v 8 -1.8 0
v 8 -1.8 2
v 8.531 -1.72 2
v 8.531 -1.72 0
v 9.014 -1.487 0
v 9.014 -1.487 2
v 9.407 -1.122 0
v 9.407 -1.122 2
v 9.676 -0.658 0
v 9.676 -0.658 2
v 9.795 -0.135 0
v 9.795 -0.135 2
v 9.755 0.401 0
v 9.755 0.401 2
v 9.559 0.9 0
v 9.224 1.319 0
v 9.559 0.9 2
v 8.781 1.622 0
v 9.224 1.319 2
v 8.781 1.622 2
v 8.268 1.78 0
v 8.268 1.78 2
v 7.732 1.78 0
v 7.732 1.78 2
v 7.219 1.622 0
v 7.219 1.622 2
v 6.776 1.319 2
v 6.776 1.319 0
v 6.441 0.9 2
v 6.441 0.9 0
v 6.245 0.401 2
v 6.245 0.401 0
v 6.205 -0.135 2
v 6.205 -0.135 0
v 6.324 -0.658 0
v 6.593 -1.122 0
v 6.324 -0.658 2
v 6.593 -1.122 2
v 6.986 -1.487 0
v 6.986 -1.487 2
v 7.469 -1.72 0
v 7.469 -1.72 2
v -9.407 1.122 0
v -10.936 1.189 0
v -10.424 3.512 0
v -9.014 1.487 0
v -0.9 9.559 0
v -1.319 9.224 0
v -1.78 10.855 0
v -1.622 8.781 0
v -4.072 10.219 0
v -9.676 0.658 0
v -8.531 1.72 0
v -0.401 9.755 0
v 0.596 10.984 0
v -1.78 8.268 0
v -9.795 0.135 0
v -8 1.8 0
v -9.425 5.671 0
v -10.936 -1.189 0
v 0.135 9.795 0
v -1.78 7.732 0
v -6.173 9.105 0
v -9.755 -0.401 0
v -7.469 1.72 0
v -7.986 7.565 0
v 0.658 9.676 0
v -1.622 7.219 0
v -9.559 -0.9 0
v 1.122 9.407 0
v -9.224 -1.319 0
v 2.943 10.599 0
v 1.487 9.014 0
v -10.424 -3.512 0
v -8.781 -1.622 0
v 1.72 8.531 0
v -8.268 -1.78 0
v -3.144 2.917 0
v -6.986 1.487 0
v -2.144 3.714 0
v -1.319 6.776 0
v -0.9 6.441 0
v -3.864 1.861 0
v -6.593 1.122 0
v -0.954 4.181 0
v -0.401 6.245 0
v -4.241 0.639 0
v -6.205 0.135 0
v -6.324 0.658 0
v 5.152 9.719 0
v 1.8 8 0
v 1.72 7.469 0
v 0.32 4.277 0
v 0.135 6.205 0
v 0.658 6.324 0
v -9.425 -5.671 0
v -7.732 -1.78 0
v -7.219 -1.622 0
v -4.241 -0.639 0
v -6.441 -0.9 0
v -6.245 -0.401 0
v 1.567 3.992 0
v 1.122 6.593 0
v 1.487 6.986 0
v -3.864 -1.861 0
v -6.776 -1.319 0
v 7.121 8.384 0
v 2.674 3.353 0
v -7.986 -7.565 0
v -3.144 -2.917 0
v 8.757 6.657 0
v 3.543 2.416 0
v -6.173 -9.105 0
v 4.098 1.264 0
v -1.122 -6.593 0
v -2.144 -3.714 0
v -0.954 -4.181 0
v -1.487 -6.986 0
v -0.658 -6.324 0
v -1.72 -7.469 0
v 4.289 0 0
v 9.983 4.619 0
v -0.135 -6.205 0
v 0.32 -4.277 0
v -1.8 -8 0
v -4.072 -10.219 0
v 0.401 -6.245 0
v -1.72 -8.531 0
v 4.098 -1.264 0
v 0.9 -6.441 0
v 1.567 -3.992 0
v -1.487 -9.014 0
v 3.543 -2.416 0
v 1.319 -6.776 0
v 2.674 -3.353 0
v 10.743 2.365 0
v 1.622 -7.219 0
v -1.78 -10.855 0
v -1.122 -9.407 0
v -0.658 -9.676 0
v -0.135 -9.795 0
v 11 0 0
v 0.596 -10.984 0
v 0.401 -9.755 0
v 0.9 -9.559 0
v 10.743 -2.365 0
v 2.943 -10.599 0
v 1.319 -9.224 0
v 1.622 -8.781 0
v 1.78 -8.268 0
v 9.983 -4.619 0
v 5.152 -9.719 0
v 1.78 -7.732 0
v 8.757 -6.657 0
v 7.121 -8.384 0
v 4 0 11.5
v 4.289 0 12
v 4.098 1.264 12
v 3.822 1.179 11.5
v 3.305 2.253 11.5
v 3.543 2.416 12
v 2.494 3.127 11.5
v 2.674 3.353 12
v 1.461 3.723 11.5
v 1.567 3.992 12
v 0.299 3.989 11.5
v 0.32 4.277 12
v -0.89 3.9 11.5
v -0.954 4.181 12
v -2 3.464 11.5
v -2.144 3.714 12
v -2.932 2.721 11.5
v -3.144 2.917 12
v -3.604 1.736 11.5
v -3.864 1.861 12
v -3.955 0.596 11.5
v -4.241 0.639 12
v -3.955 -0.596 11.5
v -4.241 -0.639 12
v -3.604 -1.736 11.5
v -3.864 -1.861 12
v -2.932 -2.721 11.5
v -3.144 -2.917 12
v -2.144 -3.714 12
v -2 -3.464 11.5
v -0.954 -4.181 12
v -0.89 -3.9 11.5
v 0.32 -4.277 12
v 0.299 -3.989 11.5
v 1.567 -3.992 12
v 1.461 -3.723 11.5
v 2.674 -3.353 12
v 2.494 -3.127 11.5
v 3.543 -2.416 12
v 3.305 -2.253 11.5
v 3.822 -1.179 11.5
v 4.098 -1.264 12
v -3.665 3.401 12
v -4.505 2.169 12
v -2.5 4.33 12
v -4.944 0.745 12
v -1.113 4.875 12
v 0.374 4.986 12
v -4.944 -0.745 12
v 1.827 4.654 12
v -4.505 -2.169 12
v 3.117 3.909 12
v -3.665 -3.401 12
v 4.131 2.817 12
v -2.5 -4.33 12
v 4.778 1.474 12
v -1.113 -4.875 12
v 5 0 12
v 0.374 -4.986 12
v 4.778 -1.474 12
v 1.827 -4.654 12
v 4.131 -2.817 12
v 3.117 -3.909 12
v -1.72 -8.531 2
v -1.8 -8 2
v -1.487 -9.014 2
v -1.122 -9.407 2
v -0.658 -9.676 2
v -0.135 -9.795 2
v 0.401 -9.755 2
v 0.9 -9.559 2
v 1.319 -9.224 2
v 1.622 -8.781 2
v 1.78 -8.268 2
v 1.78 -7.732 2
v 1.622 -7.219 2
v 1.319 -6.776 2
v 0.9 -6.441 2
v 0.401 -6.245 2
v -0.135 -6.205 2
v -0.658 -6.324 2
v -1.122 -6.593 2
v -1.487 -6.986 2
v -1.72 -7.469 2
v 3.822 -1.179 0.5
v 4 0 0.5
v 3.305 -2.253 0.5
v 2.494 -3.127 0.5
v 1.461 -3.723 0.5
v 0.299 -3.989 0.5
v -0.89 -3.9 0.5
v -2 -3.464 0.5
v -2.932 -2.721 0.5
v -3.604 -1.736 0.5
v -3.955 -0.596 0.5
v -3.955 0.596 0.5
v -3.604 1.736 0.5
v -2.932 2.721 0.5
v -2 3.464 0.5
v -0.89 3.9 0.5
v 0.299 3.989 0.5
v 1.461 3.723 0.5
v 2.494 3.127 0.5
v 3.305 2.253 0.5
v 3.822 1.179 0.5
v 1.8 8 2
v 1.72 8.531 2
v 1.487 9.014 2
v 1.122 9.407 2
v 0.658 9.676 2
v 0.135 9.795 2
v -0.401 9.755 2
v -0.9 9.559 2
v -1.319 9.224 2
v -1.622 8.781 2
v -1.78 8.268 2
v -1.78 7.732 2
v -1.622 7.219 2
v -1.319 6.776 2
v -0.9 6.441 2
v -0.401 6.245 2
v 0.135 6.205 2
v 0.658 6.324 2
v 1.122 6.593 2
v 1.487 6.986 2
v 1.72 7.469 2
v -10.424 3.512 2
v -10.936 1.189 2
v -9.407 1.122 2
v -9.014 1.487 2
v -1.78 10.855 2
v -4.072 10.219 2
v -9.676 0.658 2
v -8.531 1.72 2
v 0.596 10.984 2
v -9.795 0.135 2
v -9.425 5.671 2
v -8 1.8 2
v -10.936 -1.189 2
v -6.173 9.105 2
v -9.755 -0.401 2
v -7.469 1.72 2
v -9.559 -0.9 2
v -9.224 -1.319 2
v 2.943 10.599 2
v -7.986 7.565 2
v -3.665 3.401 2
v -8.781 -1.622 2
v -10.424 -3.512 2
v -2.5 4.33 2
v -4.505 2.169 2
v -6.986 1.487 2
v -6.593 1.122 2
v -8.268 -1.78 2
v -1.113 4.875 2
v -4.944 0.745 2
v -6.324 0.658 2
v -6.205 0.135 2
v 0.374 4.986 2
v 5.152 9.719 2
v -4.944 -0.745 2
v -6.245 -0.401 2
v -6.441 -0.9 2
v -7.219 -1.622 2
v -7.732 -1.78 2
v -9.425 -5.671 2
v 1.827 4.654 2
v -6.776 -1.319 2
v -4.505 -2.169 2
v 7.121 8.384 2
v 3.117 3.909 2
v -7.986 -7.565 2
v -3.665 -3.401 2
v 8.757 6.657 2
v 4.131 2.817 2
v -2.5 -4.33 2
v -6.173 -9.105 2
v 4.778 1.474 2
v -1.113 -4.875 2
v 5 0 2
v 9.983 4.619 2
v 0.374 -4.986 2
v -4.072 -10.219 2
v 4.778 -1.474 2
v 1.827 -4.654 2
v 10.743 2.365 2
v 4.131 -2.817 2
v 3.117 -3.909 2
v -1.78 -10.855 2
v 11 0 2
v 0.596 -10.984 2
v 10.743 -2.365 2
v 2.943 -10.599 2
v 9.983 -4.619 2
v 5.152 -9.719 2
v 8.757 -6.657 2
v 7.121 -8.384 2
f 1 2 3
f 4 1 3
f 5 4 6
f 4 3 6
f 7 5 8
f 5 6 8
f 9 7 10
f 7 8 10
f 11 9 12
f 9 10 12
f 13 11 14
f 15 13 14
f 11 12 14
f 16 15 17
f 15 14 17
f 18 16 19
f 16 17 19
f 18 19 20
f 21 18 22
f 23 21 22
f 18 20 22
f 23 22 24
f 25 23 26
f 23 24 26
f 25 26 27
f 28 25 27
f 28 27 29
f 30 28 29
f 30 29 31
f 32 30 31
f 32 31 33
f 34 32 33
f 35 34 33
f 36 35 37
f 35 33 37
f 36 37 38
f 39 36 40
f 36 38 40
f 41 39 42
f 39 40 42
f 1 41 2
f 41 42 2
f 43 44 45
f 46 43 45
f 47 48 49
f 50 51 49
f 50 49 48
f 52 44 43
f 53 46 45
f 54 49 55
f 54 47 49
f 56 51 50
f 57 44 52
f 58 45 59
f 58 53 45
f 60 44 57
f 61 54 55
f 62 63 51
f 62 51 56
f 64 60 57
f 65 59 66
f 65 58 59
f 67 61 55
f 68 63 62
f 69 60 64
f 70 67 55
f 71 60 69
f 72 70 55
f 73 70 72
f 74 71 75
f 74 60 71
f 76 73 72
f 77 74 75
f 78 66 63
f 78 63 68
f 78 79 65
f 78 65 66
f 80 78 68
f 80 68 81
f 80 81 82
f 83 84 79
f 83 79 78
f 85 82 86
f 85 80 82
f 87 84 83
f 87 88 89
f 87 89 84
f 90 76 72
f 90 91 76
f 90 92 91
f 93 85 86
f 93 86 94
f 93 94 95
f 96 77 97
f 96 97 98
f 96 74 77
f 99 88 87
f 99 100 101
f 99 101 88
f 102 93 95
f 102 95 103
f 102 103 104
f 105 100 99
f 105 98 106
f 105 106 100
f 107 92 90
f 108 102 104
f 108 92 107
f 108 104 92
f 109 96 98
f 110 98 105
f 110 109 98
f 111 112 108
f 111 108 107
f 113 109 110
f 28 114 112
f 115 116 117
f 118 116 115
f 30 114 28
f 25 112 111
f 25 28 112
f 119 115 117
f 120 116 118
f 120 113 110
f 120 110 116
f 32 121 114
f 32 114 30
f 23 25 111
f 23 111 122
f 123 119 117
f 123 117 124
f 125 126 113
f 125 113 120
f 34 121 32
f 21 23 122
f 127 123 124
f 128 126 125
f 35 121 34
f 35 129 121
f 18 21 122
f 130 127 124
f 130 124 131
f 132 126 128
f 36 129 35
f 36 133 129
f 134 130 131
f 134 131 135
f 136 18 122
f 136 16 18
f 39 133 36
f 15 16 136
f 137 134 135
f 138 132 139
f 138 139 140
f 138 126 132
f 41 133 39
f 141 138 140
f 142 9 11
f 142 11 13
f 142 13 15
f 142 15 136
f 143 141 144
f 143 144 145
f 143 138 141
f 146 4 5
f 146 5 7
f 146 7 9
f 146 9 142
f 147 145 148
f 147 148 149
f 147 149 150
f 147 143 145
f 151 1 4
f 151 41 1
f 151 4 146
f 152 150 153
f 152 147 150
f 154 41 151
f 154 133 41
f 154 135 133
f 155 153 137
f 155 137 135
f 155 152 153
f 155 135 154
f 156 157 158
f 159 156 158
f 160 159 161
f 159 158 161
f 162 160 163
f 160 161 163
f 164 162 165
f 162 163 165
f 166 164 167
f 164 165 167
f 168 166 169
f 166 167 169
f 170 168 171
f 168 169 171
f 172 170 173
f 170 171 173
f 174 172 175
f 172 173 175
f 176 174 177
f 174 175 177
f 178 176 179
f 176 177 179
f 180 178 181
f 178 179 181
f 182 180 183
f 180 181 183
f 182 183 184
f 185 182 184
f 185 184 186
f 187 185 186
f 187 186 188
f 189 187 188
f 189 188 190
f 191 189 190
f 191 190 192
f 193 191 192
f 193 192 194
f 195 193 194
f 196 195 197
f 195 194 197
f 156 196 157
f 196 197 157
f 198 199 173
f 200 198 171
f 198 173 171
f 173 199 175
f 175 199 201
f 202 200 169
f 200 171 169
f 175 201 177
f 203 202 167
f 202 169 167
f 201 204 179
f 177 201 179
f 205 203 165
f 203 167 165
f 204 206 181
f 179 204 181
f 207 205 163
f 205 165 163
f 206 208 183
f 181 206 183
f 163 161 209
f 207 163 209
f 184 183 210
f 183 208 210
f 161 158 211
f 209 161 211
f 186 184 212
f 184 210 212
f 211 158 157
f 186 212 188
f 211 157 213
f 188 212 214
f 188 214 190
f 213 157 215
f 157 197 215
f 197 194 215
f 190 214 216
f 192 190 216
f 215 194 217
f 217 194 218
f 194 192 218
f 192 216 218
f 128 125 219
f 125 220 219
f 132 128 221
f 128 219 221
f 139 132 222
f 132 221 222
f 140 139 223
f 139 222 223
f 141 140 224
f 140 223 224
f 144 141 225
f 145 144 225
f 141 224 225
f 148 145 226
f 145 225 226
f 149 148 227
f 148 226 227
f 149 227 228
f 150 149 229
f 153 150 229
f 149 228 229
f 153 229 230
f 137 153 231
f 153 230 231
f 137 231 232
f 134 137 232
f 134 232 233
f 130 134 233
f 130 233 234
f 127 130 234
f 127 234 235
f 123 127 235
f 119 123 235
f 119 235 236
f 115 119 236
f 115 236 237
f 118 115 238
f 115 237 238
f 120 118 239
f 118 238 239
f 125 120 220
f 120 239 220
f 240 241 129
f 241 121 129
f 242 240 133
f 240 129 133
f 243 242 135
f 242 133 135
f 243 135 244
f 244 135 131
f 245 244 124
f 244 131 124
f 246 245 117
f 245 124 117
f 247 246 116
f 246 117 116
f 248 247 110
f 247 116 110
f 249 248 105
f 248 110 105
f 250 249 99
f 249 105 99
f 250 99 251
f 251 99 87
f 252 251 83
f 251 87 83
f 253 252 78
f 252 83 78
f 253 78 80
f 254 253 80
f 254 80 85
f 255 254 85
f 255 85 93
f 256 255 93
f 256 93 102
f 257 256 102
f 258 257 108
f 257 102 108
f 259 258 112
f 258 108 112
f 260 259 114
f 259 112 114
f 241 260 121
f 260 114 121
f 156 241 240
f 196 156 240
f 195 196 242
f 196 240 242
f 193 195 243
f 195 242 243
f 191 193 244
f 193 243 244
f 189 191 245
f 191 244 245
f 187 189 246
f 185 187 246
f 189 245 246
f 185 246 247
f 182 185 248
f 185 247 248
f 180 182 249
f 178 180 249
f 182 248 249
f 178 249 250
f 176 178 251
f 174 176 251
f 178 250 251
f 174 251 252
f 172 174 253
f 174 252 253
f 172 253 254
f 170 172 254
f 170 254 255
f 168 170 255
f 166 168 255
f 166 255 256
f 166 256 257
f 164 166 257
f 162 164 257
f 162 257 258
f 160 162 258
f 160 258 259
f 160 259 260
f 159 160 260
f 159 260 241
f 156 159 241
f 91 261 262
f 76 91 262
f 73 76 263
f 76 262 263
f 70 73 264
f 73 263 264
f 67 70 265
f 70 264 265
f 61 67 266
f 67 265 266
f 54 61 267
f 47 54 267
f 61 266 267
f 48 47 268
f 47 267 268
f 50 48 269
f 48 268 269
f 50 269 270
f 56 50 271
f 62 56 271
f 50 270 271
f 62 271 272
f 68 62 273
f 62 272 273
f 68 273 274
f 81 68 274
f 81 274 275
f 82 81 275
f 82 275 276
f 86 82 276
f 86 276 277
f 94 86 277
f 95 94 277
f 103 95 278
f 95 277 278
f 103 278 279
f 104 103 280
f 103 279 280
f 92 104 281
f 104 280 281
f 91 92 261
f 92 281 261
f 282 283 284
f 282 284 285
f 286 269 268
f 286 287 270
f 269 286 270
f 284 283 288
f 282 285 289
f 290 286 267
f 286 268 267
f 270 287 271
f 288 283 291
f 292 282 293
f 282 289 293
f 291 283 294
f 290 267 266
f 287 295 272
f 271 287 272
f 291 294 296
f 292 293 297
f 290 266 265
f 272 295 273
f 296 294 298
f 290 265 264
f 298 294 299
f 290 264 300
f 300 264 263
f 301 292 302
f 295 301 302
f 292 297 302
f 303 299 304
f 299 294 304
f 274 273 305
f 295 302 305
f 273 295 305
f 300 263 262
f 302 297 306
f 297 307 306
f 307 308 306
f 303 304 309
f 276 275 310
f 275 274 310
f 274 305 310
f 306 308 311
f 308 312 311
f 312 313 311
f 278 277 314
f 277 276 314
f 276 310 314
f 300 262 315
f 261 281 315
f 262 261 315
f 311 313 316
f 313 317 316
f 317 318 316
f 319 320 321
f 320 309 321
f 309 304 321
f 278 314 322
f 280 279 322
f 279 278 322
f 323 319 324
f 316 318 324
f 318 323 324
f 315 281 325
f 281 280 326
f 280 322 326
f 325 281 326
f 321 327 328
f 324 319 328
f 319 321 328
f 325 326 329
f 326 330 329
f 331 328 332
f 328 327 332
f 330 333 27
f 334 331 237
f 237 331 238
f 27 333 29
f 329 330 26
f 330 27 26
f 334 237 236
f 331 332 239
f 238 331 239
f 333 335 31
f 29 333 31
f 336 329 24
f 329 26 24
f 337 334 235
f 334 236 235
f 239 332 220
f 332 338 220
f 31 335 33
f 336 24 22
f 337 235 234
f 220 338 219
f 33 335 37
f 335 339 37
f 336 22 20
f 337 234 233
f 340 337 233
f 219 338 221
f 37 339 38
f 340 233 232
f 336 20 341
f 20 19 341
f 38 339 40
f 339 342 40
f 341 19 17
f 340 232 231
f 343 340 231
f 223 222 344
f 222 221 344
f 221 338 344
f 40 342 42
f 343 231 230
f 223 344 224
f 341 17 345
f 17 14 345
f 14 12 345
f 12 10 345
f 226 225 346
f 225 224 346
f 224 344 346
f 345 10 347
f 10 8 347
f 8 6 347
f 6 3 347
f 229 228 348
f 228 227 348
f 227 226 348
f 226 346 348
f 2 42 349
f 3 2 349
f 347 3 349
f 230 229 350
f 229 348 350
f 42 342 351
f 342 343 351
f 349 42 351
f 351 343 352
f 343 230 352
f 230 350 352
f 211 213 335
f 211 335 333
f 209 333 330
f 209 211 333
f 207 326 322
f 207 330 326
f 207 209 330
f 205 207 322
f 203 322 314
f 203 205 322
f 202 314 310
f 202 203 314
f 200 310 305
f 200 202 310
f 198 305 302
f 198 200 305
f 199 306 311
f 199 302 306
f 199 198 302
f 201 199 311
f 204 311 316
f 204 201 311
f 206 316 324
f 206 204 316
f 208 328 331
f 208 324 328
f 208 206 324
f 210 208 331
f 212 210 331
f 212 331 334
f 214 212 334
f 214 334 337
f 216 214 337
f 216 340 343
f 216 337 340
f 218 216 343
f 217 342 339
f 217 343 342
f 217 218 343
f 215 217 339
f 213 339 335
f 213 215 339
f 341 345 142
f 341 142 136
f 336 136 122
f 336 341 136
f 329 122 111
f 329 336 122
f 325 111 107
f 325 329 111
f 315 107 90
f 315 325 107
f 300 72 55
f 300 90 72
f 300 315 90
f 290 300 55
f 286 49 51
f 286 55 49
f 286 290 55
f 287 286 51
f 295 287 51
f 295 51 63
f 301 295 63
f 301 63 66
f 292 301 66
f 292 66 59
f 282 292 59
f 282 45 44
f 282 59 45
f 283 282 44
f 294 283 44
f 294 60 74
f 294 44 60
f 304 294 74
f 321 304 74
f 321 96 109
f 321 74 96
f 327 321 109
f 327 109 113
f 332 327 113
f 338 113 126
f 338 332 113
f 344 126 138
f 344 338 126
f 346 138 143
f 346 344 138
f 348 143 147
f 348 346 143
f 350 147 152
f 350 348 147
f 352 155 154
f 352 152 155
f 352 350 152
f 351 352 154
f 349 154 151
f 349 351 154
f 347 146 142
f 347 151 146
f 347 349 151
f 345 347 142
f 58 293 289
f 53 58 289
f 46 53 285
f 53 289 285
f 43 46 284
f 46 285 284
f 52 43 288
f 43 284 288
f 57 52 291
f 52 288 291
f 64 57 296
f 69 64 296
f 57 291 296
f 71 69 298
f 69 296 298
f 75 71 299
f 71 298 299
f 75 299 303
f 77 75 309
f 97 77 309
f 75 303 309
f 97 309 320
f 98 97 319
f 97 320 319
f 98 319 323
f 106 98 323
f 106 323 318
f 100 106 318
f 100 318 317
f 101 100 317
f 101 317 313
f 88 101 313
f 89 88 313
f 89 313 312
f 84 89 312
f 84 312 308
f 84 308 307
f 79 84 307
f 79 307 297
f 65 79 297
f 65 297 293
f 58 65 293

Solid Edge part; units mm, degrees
sketch "Sketch1" plane through (0, 0, 0) normal (0, -1, 0) x (1, 0, 0)
  line L0 (4, 12) -> (4, 0)
  line L1 (4, 0) -> (11, 0)
  line L2 (11, 0) -> (11, 2)
  line L3 (11, 2) -> (5, 2)
  line L4 (5, 2) -> (5, 12)
  line L5 (5, 12) -> (4, 12)
  dimension "D1" = 12
  dimension "D2" = 2
revolve "RevolvedProtrusion1" add sketch "Sketch1" angle 360 about axis through (0, 0, 54) along (0, 0, -1)
hole "Hole1" at (8, 0, 2) direction (0, 0, -1) diameter 3.6 end up to next
pattern_circular "Pattern1" count 4 over 360 about axis through (0, 0, 2) along (0, 0, 1) of "Hole1"
chamfer "Chamfer_1" distance 0.5 angle 30 2 edges at (-4, 0, 12) (-4, 0, 0) measured on face at (2.2136, -3.3317, 9.88)
properties material "Stainless steel"
